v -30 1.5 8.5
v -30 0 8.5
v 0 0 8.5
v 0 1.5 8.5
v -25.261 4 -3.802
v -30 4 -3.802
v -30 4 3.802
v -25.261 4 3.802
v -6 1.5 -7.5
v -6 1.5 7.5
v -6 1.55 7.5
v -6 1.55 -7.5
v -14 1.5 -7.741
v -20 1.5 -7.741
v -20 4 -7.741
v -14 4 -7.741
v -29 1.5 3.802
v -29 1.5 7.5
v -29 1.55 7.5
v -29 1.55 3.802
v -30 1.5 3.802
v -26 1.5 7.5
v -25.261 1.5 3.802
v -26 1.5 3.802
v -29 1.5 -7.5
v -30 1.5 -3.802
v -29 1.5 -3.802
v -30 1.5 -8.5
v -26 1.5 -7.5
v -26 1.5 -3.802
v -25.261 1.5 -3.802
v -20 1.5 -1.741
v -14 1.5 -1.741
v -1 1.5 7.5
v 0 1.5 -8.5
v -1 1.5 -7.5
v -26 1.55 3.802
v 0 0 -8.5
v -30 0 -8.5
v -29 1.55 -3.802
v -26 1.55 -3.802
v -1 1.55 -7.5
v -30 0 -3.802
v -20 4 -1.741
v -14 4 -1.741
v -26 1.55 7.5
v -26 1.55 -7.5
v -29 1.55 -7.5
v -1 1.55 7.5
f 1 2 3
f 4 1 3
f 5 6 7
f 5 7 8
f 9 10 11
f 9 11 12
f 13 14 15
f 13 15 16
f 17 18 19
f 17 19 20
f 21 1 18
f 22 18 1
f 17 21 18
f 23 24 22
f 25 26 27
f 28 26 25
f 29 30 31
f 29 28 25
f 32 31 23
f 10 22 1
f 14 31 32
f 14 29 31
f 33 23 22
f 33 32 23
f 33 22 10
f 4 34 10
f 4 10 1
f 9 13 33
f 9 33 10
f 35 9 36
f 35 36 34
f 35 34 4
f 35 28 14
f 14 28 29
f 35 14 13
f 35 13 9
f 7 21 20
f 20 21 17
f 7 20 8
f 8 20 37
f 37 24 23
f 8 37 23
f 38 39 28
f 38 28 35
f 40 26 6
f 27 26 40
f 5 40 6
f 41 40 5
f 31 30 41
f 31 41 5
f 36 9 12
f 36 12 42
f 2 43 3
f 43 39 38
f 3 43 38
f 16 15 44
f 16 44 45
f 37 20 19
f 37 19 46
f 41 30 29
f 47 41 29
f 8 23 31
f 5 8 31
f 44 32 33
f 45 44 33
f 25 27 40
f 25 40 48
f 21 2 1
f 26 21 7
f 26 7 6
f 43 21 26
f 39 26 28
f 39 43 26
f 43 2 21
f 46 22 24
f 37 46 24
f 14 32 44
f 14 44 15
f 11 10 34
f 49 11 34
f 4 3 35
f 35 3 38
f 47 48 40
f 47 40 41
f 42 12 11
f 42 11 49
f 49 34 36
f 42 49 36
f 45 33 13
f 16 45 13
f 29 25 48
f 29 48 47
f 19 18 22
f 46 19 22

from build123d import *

# Parameters (mm, degrees)
SKETCH_1_W      = 30
SKETCH_1_H      = 17
EXTRUDE_1_DEPTH = 1.5
SKETCH_4_W      = 6
SKETCH_4_H      = 6
SKETCH_4_W_2    = 4.739464385
SKETCH_4_H_2    = 7.603341308
EXTRUDE_3_DEPTH = 4
SKETCH_6_W      = 5
SKETCH_6_H      = 15
SKETCH_6_W_2    = 3
EXTRUDE_4_DEPTH = 1.55


with BuildPart() as part:
    # Эскиз1 → Бобышка-Вытянуть1 (new body)
    with BuildSketch(Plane(origin=(0, 0, 0), x_dir=(1, 0, 0), z_dir=(0, 1, 0))):
        with Locations((-15, 0)):
            Rectangle(SKETCH_1_W, SKETCH_1_H)
    extrude(amount=EXTRUDE_1_DEPTH)

    # Эскиз4 → Бобышка-Вытянуть3 (add)
    with BuildSketch(Plane(origin=(0, 0, 0), x_dir=(1, 0, 0), z_dir=(0, 1, 0))):
        with Locations((-17, 4.741395497)):
            Rectangle(SKETCH_4_W, SKETCH_4_H)
        with Locations((-27.630267808, 0)):
            Rectangle(SKETCH_4_W_2, SKETCH_4_H_2)
    extrude(amount=EXTRUDE_3_DEPTH)

    # Эскиз6 → Бобышка-Вытянуть4 (add)
    with BuildSketch(Plane(origin=(0, 0, 0), x_dir=(1, 0, 0), z_dir=(0, 1, 0))):
        with Locations((-3.5, 0)):
            Rectangle(SKETCH_6_W, SKETCH_6_H)
        with Locations((-27.5, 0)):
            Rectangle(SKETCH_6_W_2, SKETCH_6_H)
    extrude(amount=EXTRUDE_4_DEPTH)


solid = part.part
